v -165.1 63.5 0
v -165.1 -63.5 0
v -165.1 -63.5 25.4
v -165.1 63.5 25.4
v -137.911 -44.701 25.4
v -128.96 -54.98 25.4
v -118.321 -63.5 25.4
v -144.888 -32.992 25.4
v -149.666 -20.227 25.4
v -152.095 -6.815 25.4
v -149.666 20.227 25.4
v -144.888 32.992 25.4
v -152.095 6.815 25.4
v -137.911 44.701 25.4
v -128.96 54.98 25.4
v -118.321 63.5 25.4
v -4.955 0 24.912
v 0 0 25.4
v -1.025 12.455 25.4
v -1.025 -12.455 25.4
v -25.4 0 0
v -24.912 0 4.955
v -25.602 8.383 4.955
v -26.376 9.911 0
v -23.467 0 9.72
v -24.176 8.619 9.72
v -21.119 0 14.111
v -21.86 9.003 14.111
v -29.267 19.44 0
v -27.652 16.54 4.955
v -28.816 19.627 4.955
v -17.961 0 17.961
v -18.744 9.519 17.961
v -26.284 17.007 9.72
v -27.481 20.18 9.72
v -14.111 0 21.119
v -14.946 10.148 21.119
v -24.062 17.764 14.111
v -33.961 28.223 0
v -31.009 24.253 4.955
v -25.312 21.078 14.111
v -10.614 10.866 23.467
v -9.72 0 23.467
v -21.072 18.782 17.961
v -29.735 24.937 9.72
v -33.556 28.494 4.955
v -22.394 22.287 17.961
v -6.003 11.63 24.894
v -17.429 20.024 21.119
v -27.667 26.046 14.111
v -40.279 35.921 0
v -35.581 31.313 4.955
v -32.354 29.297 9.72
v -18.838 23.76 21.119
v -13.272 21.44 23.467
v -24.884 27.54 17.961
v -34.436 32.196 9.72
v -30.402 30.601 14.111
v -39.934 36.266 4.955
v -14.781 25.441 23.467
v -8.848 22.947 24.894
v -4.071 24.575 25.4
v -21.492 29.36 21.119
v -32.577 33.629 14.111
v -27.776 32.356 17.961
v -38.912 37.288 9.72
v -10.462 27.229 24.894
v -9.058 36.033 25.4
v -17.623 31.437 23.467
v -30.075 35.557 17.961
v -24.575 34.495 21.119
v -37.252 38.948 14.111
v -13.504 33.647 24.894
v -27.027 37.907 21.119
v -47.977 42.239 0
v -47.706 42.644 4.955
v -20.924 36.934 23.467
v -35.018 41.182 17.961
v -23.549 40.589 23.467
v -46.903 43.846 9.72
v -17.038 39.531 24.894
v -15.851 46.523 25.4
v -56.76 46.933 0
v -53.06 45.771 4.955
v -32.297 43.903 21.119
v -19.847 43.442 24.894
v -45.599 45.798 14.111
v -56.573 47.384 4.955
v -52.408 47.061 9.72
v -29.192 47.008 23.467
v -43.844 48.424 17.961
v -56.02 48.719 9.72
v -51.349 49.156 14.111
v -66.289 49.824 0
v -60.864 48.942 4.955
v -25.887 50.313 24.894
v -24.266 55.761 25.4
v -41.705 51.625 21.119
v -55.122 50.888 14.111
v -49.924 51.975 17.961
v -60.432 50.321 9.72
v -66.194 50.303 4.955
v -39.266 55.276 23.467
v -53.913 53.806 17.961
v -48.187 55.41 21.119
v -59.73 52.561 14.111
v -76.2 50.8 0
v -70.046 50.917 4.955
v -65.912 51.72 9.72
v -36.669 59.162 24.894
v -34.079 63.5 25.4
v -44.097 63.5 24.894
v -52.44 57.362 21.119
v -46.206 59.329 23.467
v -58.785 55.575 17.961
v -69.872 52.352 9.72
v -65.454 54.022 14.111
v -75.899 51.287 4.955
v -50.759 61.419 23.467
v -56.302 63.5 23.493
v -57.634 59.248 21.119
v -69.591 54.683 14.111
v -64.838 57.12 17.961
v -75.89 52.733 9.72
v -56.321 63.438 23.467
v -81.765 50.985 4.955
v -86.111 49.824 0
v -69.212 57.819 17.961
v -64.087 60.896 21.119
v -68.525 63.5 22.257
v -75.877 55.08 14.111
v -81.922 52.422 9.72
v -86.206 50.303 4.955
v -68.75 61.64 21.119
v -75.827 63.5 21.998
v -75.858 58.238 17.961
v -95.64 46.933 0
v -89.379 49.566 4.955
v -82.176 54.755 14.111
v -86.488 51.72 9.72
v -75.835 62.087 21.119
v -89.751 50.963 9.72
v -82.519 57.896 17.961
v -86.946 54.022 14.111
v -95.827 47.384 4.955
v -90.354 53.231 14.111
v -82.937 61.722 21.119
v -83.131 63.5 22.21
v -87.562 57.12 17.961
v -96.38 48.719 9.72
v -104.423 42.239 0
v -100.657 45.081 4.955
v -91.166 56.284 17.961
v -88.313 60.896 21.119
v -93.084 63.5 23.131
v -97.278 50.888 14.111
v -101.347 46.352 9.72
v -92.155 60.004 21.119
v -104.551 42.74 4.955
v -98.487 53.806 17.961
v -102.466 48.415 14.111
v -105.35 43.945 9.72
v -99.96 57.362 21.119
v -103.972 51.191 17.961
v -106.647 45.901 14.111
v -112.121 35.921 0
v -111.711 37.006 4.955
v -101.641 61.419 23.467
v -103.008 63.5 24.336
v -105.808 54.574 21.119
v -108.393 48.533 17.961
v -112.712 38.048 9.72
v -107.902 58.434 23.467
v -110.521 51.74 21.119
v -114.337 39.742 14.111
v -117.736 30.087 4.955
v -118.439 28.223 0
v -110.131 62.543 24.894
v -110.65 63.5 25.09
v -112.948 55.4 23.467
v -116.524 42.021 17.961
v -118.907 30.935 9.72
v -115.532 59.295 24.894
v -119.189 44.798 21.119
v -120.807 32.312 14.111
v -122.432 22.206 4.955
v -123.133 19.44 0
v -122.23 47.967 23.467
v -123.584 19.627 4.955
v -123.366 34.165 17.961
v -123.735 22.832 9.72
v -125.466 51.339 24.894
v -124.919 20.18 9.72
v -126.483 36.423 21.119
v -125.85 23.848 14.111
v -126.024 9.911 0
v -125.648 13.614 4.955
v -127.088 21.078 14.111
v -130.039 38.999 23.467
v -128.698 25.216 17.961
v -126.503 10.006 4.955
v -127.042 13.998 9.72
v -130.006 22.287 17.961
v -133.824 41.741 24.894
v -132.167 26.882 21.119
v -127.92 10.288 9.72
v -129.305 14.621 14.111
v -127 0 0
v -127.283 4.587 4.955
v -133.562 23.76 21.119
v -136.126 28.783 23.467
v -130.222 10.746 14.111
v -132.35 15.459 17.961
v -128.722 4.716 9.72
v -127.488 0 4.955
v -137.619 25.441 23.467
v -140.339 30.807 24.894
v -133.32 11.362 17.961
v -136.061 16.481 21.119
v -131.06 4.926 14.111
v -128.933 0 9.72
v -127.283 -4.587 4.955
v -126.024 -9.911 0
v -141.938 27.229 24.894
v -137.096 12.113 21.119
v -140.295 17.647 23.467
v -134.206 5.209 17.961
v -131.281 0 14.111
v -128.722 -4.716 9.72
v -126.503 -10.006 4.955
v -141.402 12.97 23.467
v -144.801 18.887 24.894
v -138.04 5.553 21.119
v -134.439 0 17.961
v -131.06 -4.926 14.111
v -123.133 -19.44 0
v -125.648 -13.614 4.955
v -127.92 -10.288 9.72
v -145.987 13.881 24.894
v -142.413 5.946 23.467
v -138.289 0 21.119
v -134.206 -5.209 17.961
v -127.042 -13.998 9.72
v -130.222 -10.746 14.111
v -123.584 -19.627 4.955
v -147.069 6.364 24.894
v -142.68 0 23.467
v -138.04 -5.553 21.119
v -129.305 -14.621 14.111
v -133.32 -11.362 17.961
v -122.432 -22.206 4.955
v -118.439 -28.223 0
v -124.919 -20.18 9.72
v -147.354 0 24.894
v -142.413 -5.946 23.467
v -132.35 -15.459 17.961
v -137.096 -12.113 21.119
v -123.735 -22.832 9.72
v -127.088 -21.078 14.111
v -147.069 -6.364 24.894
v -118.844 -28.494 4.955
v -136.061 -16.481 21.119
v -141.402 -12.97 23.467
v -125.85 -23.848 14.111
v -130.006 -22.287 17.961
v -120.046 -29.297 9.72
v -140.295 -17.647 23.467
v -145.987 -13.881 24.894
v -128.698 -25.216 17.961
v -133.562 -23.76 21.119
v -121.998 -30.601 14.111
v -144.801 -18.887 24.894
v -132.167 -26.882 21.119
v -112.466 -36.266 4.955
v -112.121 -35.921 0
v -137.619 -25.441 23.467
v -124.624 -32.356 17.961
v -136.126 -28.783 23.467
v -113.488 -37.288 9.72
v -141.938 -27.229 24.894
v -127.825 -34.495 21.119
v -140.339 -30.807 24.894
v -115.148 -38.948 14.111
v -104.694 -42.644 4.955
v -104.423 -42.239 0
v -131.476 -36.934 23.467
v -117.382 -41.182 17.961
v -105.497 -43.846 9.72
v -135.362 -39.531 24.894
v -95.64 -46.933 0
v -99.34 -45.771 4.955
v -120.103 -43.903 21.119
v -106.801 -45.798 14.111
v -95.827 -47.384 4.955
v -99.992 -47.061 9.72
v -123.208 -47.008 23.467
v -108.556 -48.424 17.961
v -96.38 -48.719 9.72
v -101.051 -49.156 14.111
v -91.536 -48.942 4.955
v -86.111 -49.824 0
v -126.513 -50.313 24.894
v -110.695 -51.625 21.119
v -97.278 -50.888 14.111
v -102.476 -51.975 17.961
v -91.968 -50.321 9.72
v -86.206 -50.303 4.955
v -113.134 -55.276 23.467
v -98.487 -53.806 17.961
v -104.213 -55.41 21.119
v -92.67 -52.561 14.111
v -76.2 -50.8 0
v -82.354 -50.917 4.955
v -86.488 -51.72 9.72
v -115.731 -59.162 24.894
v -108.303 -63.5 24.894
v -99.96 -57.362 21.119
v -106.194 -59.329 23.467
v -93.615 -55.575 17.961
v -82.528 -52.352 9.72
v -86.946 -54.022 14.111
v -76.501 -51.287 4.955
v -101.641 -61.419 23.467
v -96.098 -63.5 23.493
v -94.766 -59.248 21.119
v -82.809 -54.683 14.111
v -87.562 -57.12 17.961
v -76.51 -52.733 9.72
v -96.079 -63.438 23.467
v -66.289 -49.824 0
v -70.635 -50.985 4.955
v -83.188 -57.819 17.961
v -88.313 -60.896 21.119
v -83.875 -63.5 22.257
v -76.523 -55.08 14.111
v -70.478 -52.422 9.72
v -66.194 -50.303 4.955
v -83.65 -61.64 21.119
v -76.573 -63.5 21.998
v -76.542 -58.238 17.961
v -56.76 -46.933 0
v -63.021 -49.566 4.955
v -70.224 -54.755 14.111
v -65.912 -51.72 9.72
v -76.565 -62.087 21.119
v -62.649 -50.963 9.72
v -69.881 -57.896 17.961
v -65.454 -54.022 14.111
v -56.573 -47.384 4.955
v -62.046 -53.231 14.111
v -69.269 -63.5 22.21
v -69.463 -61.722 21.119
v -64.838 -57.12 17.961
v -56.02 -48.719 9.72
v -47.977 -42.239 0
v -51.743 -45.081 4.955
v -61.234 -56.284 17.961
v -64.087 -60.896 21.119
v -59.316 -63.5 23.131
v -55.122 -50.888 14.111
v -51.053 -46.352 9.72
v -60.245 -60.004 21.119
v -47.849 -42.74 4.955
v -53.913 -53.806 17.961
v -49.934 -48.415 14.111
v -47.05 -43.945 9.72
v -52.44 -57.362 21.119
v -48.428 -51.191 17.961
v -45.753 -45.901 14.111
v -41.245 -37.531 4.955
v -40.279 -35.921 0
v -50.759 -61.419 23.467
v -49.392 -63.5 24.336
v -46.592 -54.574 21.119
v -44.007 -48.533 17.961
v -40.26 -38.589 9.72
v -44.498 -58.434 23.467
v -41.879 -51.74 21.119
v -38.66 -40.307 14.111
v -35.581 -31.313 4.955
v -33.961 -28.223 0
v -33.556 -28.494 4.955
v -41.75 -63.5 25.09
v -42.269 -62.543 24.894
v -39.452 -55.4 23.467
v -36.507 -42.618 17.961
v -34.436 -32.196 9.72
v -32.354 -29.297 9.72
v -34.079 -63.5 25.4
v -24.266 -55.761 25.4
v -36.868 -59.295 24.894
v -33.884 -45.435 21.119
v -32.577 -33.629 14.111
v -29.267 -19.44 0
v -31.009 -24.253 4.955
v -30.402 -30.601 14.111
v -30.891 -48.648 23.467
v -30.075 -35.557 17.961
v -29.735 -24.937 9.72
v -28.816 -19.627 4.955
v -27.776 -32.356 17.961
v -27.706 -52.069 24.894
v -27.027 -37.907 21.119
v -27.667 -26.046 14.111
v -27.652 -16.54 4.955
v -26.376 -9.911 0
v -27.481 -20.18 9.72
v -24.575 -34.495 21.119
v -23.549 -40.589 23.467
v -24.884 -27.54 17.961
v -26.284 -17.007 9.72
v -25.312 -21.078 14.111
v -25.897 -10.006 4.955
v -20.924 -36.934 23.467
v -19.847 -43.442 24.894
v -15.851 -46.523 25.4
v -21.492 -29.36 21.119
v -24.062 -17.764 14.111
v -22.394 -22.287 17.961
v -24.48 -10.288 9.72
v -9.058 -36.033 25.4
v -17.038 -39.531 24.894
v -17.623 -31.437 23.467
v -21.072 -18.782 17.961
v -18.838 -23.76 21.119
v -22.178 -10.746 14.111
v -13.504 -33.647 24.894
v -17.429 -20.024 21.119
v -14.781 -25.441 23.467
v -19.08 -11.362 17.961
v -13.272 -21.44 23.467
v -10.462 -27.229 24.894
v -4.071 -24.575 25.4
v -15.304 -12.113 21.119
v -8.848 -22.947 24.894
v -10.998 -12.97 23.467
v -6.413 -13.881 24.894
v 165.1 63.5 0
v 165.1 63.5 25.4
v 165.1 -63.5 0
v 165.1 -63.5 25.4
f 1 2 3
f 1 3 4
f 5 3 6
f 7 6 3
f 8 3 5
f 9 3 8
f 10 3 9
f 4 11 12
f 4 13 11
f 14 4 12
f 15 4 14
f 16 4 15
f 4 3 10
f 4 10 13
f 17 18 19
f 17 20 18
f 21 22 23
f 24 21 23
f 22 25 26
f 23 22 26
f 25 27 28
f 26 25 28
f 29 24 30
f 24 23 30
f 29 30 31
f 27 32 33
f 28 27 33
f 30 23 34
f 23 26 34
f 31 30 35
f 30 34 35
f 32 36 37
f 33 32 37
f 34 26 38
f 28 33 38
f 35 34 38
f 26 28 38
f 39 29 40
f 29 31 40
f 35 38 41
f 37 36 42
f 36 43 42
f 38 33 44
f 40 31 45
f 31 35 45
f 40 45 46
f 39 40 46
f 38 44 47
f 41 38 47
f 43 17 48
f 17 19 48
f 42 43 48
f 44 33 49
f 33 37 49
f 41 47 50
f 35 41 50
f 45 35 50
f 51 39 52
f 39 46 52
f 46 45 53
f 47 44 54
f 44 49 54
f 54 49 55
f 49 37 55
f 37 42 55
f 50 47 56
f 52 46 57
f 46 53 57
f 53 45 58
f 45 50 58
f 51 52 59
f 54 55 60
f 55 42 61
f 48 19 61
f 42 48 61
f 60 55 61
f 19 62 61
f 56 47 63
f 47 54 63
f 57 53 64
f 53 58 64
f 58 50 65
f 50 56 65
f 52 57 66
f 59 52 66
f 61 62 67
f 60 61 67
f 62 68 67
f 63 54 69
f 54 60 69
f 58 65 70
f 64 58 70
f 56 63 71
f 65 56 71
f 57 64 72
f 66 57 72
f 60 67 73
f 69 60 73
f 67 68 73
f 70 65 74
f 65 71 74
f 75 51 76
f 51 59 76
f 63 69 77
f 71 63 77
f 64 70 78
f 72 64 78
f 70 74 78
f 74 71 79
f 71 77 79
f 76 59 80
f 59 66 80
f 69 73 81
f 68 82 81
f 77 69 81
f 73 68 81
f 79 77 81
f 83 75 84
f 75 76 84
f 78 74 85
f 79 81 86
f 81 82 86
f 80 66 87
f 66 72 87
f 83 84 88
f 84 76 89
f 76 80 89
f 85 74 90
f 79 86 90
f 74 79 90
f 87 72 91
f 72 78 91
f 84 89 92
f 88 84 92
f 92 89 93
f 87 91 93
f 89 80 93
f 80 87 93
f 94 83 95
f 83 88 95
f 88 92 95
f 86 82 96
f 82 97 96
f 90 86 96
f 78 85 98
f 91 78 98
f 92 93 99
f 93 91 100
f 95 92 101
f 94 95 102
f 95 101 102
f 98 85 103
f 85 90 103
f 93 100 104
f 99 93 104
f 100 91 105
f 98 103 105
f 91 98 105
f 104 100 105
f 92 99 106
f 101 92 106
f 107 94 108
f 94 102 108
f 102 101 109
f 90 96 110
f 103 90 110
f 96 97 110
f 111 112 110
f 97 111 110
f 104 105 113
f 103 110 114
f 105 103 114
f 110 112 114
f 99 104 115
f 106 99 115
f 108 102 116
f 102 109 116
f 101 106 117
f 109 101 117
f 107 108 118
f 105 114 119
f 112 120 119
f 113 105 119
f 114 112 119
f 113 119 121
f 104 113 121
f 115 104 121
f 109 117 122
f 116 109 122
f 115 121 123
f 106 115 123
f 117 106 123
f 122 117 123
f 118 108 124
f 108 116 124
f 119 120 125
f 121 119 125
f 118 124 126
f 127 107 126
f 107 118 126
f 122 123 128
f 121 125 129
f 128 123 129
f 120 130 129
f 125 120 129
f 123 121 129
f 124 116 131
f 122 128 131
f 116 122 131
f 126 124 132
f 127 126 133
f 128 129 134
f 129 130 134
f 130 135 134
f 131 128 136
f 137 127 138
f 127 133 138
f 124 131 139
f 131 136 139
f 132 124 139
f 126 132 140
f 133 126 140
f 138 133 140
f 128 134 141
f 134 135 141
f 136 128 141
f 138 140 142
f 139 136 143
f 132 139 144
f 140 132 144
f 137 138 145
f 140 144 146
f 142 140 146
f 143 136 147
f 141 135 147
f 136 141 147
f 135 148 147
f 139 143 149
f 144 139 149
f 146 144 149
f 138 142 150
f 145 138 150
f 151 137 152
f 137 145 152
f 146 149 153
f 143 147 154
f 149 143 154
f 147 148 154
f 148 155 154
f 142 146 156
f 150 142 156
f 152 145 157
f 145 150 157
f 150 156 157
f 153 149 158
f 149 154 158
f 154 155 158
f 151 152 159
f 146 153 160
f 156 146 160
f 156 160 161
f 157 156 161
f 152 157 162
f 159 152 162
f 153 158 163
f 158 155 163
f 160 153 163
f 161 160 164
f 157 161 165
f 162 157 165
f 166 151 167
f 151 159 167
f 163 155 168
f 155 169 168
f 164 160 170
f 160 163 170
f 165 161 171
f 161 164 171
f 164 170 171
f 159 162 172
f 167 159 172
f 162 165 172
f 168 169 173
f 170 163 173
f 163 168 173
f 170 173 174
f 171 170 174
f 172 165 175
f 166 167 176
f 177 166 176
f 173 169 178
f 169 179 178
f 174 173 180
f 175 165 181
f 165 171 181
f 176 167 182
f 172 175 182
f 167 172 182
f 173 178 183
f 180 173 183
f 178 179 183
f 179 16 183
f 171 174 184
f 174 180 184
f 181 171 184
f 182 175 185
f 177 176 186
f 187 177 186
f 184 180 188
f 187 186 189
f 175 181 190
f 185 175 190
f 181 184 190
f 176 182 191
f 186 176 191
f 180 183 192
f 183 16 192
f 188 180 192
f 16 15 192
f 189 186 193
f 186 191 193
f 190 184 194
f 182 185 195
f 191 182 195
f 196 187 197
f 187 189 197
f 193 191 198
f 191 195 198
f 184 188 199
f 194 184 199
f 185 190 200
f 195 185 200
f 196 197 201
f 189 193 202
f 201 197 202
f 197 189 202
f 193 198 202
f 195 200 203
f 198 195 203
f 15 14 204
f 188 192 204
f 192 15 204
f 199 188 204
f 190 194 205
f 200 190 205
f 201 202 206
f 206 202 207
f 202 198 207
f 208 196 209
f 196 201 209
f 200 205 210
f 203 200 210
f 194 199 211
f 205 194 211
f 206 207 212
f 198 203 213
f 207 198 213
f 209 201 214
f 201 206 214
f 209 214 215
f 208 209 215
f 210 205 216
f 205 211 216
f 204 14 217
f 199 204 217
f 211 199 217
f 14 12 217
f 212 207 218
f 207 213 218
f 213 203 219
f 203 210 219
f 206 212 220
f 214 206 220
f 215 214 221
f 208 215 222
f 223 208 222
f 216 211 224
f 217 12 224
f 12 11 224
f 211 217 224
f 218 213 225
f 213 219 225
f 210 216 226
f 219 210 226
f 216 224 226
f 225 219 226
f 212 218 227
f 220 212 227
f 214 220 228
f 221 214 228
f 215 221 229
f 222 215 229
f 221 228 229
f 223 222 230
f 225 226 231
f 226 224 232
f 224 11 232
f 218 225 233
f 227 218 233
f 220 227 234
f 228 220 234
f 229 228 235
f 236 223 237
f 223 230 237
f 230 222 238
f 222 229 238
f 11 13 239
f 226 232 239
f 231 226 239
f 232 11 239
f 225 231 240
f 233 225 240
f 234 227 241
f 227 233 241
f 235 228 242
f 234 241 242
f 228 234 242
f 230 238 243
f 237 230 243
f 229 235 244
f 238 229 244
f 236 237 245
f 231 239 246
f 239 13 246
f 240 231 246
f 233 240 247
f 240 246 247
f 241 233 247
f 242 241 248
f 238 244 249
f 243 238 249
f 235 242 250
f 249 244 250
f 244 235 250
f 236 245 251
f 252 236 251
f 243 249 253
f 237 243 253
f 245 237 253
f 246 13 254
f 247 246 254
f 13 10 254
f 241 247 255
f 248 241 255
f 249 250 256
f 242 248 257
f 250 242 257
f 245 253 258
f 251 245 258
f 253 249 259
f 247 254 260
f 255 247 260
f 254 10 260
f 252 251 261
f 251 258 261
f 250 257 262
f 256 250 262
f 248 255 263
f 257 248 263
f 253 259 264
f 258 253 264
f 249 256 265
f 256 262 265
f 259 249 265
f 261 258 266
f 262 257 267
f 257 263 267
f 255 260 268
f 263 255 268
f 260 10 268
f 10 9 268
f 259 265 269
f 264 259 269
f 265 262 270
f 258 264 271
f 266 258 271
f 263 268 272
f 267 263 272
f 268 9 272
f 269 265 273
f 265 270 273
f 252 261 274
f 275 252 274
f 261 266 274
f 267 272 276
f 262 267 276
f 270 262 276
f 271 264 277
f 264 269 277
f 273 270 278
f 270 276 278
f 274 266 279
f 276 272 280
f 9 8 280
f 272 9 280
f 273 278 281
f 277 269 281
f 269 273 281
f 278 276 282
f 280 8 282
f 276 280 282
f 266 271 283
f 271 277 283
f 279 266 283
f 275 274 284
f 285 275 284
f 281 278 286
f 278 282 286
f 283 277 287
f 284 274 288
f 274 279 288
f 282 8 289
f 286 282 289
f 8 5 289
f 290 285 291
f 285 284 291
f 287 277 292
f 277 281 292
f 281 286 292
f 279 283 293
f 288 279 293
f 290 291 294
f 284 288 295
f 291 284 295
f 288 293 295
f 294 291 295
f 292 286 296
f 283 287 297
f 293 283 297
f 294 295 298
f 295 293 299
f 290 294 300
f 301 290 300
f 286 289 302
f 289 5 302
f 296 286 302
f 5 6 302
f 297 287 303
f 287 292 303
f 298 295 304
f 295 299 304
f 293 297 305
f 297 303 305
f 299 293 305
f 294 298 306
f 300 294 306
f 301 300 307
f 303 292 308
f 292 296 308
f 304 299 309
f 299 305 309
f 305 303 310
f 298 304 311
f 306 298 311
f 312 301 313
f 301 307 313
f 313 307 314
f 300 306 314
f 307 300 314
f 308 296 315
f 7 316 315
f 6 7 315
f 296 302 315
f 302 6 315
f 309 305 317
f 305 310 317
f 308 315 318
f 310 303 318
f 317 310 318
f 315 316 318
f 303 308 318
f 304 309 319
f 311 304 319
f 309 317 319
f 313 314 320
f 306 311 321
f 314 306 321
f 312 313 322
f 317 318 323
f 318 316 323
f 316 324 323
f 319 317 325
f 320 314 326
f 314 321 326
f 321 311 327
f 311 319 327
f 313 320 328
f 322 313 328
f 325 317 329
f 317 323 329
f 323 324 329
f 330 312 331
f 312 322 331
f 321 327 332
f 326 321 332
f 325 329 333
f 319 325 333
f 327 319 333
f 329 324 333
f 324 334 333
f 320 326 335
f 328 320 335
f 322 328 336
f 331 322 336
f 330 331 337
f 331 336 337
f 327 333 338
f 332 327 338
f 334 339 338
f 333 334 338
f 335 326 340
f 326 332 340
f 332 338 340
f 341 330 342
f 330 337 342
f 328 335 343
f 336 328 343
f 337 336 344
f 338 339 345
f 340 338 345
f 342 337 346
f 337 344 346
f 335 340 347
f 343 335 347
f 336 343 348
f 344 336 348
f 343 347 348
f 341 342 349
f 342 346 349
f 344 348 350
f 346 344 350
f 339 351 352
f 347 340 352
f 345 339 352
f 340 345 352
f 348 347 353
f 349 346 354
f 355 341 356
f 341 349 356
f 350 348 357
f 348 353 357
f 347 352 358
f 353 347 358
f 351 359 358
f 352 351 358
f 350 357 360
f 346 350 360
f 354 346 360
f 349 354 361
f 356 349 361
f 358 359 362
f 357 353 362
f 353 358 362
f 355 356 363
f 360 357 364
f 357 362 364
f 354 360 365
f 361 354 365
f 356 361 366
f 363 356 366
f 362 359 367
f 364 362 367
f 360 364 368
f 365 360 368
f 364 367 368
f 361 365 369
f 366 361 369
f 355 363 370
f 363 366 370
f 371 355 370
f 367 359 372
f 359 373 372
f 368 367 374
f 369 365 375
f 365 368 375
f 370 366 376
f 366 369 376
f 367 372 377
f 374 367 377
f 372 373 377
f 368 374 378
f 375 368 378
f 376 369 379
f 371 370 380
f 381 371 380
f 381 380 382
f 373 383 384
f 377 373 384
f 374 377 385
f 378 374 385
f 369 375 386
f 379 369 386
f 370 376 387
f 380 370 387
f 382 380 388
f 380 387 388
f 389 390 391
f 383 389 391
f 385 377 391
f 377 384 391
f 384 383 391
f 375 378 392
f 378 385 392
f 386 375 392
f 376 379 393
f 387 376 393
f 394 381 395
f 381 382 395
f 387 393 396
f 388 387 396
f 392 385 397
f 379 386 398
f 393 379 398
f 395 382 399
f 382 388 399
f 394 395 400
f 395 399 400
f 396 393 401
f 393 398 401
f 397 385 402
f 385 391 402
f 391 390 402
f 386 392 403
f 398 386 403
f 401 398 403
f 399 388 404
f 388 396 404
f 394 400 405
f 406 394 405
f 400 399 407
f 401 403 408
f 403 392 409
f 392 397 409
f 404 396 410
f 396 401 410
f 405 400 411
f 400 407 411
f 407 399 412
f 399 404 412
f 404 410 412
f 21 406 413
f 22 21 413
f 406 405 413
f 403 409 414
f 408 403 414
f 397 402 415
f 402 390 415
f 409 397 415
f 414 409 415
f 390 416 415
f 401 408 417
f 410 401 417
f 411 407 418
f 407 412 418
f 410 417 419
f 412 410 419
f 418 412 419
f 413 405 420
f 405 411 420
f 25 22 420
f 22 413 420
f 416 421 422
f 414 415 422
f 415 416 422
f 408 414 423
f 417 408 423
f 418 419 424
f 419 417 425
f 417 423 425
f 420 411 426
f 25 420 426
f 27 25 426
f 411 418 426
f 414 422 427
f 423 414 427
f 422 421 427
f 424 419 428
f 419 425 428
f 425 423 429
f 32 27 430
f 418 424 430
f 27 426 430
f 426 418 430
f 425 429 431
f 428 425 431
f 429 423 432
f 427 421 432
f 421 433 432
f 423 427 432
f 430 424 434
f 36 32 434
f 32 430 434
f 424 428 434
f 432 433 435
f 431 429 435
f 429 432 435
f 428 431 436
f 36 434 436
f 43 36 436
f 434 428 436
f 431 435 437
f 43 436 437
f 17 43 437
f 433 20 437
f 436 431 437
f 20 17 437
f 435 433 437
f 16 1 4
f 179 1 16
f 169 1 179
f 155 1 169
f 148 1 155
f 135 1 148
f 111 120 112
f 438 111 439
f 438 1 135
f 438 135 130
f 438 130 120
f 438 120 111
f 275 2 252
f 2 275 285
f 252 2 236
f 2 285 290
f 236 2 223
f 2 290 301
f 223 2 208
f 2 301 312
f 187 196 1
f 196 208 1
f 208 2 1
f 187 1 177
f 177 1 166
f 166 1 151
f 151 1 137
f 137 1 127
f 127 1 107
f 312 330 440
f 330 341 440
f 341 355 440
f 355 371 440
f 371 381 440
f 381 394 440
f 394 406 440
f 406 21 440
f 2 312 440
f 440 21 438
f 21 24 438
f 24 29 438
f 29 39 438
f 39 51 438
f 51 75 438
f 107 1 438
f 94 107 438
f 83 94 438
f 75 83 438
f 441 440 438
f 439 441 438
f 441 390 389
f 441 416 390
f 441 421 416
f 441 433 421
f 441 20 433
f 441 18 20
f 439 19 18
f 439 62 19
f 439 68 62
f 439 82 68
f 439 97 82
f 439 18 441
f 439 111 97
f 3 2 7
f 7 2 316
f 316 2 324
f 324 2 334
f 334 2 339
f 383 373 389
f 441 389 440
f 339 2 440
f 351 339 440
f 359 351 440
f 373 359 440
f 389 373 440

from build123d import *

# Parameters (mm, degrees)
F0_W     = 330.2
F0_H     = 127
F0_R     = 50.8
F1_DEPTH = 25.4


# Not quite as in the source:
# - a fillet or chamfer that OpenCascade refuses, or shapes differently, is made with other operations: its cross-section is extruded or revolved along the edge and cut away or added


with BuildPart() as f1:
    # F0 (on Top) → F1 (new body)
    with BuildSketch(Plane.XY):
        Rectangle(F0_W, F0_H)
        with Locations((-76.2, 0)):
            Circle(F0_R, mode=Mode.SUBTRACT)
    extrude(amount=F1_DEPTH)

    # F2: fillet of radius 25.4 on 1 edges, made by hand

    # F2_s1 → F2_t2 (revolve, cut)
    with BuildSketch(Plane.XZ):
        with BuildLine():
            ThreePointArc((-25.4, 0), (-17.9605122421, 17.9605122421), (0, 25.4))
            Line((0, 25.4), (-25.4, 25.4))
            Line((-25.4, 25.4), (-25.4, 0))
        make_face()
    revolve(axis=Axis((-76.2, 0, 25.4), (0, 0, 1)), mode=Mode.SUBTRACT)


solid = f1.part
